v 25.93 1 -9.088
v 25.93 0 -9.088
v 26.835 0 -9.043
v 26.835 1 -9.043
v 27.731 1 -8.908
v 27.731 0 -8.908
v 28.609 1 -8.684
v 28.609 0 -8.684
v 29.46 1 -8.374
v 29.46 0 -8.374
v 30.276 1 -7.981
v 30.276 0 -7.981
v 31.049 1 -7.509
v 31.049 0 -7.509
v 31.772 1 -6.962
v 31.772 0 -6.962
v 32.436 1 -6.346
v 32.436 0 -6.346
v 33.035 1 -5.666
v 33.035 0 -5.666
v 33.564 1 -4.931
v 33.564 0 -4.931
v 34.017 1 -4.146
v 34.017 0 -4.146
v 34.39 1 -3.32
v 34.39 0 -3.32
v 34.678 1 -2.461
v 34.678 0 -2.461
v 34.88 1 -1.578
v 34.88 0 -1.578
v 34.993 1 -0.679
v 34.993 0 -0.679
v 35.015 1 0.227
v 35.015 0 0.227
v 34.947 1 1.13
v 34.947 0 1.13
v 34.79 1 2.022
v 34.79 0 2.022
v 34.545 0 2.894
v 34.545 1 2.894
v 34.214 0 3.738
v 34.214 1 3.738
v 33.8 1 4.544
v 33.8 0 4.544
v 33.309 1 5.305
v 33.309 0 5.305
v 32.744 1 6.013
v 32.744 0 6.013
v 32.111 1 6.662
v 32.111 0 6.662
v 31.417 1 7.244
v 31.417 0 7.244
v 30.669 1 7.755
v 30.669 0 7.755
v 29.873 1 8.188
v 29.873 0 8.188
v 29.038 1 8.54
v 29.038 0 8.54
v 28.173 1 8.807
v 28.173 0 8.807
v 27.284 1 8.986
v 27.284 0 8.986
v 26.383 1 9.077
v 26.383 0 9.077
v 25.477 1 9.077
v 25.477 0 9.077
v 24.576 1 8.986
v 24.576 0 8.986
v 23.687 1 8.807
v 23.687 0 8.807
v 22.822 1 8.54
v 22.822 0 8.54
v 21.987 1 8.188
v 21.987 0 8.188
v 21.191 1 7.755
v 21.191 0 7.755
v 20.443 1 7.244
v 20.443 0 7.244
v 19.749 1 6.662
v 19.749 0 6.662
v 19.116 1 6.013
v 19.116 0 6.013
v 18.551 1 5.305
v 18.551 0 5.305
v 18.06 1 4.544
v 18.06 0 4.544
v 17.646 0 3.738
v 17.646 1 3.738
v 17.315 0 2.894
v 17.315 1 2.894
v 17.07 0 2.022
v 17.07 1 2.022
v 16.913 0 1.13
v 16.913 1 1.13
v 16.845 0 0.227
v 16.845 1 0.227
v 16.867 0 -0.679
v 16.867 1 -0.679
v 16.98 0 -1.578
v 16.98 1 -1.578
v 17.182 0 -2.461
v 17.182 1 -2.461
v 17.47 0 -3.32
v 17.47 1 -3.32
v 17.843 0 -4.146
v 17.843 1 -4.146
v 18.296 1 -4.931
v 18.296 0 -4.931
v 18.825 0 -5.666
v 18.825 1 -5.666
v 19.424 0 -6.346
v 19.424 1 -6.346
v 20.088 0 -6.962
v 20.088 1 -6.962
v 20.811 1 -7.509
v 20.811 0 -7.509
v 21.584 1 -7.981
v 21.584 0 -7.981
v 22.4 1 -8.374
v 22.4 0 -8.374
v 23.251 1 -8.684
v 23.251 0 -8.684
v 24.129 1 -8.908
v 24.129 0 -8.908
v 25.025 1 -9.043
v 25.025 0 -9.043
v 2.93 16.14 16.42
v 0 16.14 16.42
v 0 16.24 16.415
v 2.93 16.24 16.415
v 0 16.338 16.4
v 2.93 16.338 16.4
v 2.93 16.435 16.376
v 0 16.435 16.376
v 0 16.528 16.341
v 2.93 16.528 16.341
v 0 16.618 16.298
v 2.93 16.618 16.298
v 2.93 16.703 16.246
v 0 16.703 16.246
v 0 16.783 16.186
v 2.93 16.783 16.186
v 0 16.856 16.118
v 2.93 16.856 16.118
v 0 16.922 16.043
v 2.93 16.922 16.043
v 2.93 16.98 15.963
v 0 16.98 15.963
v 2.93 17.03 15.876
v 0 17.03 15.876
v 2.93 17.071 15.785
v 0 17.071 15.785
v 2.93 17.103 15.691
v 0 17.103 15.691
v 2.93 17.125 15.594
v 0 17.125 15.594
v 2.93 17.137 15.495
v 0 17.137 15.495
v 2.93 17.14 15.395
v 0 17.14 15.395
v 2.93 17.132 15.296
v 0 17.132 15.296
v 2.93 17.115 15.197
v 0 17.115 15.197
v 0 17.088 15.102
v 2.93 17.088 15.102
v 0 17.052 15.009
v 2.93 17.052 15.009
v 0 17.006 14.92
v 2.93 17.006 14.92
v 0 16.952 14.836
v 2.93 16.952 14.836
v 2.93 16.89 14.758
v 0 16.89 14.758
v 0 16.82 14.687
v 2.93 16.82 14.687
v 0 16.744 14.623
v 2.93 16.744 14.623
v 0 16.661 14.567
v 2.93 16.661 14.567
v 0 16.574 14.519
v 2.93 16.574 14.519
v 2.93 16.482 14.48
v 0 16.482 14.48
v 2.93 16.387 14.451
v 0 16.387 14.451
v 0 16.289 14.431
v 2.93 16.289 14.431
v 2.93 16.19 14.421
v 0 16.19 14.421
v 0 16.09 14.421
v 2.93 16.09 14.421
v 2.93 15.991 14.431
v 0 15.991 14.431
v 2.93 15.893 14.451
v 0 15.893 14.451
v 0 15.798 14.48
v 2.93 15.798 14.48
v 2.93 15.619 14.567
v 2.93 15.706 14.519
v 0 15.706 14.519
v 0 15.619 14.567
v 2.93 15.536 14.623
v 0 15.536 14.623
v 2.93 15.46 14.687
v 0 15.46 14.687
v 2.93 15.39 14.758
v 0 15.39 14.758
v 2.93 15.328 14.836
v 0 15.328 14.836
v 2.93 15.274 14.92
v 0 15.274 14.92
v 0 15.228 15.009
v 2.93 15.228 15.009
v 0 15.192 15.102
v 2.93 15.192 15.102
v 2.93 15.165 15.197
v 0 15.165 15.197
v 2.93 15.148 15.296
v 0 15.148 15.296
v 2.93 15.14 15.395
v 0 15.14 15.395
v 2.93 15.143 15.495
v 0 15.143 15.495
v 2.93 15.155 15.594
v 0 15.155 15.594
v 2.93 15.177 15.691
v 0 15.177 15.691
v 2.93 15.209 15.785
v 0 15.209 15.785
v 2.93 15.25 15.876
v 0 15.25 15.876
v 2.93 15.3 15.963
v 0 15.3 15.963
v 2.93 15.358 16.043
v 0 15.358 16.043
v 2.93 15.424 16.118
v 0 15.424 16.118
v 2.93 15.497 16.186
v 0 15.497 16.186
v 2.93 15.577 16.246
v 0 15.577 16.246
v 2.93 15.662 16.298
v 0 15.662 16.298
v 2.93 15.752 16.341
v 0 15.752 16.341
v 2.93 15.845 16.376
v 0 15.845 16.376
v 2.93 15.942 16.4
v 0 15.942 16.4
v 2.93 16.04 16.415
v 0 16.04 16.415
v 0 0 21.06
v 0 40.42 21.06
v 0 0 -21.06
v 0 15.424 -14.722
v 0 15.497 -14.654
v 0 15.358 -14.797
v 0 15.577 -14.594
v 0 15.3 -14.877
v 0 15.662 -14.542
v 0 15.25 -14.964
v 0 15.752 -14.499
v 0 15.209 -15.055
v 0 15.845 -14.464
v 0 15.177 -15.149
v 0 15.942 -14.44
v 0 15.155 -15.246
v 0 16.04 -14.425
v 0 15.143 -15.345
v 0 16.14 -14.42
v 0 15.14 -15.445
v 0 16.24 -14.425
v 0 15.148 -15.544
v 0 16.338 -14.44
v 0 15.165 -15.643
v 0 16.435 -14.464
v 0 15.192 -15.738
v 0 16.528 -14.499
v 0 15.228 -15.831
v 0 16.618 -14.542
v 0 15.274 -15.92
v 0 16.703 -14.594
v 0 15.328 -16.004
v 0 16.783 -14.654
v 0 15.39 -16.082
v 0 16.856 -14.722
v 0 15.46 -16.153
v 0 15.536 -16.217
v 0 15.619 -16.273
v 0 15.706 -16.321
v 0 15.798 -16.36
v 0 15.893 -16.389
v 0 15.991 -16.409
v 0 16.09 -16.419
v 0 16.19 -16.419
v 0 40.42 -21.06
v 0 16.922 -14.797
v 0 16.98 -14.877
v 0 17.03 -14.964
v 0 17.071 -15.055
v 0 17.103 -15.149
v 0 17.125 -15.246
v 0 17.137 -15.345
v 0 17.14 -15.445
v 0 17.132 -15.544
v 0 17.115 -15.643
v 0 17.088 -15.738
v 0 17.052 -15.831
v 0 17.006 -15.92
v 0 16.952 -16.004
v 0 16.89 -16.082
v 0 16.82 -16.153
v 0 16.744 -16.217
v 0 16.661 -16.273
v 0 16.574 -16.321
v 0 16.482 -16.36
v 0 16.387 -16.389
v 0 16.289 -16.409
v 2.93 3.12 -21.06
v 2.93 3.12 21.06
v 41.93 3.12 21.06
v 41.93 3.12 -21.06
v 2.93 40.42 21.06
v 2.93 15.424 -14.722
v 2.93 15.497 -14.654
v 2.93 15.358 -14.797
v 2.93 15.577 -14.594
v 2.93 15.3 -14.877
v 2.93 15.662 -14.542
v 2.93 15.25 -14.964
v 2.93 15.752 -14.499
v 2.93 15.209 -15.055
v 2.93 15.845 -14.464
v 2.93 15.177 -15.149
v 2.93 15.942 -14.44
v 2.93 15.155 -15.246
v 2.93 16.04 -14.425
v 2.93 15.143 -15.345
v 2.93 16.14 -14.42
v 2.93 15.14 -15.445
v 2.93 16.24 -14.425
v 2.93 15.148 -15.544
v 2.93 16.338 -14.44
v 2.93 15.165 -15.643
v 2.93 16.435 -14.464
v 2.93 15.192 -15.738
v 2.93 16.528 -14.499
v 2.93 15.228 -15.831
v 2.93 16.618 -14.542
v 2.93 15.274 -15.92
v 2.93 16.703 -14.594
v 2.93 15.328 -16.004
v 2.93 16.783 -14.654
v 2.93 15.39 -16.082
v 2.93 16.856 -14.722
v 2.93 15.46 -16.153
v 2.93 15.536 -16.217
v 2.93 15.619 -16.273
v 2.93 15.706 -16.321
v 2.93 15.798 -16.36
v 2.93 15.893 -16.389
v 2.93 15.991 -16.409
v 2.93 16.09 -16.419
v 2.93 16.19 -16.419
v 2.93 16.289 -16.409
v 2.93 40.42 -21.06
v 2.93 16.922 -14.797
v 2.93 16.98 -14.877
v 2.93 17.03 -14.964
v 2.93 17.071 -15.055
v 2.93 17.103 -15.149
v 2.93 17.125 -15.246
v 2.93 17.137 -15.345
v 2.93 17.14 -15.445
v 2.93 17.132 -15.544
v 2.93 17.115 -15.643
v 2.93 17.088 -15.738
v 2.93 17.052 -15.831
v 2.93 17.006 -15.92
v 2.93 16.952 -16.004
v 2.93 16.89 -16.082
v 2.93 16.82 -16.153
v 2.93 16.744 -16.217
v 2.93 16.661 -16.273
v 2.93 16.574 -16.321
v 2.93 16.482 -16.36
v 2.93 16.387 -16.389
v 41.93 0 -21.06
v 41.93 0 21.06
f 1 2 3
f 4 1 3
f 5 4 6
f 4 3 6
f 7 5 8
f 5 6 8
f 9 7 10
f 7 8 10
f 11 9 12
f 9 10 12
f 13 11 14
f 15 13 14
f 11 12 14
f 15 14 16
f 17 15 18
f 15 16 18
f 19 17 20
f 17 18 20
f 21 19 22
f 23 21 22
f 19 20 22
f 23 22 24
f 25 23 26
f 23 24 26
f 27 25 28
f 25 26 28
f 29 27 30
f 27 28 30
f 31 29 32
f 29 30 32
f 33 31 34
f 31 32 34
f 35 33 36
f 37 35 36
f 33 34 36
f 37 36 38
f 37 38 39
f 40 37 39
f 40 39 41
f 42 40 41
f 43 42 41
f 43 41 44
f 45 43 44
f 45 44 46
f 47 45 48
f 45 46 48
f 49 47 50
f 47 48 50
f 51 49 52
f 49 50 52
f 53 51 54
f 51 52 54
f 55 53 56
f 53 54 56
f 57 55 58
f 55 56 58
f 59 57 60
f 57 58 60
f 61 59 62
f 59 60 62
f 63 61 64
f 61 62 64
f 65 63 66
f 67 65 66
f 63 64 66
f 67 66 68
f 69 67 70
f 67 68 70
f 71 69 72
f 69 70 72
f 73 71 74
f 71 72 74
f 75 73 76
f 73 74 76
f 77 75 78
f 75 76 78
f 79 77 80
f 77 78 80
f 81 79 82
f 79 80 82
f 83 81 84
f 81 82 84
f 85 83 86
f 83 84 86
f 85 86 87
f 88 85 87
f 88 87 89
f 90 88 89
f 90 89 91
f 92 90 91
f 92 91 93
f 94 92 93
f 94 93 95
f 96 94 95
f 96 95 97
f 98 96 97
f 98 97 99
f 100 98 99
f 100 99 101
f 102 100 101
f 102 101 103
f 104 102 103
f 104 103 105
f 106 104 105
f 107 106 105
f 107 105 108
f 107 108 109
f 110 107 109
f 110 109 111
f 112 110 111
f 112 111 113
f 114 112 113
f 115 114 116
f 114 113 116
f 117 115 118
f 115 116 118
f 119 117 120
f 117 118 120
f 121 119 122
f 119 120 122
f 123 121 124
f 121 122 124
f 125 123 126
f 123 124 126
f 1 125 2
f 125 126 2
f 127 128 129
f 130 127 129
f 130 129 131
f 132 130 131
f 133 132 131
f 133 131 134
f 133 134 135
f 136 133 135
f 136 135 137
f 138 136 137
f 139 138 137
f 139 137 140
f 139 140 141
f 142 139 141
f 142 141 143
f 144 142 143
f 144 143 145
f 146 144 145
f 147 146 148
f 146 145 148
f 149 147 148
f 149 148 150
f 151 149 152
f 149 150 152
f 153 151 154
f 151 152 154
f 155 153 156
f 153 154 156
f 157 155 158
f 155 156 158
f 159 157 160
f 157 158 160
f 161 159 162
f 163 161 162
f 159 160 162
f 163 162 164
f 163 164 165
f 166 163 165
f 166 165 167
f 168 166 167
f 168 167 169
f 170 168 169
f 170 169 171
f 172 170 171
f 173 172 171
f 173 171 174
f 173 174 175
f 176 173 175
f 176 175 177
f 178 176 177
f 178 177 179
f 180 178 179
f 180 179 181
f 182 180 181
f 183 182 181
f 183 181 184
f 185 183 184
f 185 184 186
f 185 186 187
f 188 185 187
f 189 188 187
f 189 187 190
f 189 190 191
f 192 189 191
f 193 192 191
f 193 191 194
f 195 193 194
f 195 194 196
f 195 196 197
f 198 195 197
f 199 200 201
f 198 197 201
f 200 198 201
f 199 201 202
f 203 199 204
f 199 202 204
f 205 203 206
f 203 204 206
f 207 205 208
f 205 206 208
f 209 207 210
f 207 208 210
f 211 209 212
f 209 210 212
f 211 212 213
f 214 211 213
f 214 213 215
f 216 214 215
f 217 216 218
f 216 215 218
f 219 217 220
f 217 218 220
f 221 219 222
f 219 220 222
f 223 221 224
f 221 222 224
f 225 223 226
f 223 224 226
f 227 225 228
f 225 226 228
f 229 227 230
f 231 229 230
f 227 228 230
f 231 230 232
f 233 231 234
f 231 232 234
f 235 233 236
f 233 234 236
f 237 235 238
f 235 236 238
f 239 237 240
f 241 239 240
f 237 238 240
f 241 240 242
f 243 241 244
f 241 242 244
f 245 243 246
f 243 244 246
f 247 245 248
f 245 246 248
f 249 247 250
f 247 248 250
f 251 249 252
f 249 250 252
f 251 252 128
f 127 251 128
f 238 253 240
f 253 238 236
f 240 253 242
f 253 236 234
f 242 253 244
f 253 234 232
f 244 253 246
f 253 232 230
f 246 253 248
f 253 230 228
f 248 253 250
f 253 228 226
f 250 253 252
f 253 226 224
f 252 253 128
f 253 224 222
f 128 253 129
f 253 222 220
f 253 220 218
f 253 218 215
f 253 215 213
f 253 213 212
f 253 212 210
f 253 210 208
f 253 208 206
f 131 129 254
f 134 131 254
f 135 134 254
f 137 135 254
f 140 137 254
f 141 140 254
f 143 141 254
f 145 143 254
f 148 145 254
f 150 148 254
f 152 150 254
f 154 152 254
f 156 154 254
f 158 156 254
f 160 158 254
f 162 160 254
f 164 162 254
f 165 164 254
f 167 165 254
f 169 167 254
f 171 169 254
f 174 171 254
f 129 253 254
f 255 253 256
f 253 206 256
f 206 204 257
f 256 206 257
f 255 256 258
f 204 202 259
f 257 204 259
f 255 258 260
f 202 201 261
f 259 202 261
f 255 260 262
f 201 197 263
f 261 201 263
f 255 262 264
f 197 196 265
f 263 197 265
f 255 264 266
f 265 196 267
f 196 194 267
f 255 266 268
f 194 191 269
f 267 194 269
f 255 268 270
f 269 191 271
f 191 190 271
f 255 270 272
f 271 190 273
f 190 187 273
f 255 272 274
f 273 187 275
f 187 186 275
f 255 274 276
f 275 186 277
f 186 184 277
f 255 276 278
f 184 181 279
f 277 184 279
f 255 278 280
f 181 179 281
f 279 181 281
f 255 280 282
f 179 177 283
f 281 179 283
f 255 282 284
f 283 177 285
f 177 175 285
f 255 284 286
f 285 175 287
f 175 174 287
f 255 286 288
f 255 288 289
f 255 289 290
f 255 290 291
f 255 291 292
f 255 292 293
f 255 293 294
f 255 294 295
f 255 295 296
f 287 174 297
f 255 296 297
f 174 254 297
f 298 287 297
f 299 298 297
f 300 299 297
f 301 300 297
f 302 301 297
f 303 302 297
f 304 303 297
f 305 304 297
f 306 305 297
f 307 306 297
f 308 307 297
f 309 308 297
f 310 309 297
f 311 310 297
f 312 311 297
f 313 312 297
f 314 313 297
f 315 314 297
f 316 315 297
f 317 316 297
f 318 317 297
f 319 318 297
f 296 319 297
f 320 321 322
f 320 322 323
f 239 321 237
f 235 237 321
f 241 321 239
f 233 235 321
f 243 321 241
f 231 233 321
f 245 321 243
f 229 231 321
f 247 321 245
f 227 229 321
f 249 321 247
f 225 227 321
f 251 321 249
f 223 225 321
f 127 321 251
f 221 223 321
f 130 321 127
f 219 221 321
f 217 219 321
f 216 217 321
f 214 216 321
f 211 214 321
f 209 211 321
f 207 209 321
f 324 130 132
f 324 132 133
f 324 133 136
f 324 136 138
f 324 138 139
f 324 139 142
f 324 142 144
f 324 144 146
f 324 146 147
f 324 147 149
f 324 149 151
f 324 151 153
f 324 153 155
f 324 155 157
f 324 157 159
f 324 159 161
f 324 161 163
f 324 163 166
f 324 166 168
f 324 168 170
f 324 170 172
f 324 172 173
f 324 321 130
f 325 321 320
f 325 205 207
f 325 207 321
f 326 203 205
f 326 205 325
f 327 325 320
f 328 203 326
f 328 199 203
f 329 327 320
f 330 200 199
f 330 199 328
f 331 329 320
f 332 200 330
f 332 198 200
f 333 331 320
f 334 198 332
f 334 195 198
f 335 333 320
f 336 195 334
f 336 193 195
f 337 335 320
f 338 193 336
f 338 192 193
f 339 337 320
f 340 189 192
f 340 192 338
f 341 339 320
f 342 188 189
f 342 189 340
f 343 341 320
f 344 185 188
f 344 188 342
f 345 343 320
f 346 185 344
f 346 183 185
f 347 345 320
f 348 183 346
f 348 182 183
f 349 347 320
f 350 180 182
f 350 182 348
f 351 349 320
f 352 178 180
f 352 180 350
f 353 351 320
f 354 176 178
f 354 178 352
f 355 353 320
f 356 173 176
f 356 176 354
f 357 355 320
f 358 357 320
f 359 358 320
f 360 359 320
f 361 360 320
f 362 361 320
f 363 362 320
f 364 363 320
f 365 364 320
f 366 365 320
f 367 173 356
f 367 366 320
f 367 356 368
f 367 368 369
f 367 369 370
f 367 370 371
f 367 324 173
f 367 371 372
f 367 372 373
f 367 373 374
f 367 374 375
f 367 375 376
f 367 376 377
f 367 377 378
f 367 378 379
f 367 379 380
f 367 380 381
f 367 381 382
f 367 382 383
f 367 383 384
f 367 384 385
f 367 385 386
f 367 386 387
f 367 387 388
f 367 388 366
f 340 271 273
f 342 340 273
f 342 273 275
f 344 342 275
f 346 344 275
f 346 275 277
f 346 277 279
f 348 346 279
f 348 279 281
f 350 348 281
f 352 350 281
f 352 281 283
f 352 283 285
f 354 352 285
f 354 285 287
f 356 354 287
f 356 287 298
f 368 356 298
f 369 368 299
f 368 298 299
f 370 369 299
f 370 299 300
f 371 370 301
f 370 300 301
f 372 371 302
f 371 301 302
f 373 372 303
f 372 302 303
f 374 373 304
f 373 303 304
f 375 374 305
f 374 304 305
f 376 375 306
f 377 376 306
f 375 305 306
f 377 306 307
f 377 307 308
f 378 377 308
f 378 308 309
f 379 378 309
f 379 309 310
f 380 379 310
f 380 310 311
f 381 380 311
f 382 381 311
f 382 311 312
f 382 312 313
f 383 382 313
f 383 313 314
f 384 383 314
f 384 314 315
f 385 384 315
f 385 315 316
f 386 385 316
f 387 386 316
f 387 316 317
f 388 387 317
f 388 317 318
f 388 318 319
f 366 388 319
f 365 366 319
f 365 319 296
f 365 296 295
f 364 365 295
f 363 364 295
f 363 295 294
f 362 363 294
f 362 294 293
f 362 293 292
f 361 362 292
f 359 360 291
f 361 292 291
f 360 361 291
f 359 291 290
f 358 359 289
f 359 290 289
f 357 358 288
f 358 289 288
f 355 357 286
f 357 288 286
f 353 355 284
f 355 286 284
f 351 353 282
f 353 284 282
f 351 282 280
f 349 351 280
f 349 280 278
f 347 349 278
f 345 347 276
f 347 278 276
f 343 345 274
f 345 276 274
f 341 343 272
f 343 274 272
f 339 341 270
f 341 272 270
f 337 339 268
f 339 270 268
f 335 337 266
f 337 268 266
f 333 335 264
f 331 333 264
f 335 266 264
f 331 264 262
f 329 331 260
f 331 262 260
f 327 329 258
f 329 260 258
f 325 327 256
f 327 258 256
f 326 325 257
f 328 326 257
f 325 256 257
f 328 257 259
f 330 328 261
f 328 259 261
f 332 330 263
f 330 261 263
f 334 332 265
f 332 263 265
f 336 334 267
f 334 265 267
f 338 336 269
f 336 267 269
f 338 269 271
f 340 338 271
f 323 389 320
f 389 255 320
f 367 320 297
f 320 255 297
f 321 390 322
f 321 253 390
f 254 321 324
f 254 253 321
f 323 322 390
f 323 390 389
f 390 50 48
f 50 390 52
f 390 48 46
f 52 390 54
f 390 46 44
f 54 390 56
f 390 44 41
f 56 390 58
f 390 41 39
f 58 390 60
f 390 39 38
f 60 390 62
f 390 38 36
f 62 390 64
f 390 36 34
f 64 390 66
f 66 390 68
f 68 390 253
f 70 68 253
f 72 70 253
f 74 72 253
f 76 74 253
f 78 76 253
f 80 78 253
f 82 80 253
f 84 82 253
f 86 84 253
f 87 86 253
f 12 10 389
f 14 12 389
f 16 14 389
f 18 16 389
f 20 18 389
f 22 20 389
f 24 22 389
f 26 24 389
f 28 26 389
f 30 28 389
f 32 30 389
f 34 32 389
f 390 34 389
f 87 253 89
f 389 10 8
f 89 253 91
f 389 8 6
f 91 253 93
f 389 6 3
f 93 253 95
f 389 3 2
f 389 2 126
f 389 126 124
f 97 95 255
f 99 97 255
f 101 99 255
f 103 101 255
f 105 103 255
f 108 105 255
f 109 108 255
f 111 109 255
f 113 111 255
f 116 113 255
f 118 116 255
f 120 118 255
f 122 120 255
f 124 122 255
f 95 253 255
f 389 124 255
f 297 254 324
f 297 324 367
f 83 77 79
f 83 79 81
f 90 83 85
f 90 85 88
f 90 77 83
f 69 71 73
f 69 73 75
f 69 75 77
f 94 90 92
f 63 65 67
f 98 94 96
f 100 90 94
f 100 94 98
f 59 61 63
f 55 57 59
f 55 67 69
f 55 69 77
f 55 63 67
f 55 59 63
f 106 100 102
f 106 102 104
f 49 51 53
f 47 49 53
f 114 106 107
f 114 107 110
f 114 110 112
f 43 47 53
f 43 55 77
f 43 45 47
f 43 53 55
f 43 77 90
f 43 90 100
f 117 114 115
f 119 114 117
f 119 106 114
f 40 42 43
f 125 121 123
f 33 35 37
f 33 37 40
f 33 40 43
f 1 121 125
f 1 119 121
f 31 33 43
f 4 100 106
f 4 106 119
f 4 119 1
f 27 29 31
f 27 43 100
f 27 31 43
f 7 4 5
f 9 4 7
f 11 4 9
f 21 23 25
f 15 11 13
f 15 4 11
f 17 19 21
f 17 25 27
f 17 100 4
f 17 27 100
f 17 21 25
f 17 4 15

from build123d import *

# Parameters (mm, degrees)
SKETCH1_W           = 42.12
SKETCH1_H           = 40.42
BOSS_EXTRUDE1_DEPTH = 0.01
SKETCH2_W           = 42.12
SKETCH2_H           = 40.42
BOSS_EXTRUDE2_DEPTH = 2.92
SKETCH3_W           = 42.12
SKETCH3_H           = 3.12
BOSS_EXTRUDE3_DEPTH = 39
SKETCH4_R           = 1
CUT_EXTRUDE1_DEPTH  = 62.930807358
SKETCH5_R           = 9.087989047
CUT_EXTRUDE2_DEPTH  = 1


with BuildPart() as part:
    # Sketch1 → Boss-Extrude1 (new body)
    with BuildSketch(Plane(origin=(0, 0, 0), x_dir=(0, 0, -1), z_dir=(1, 0, 0))):
        with Locations((0, 20.21)):
            Rectangle(SKETCH1_W, SKETCH1_H)
    extrude(amount=BOSS_EXTRUDE1_DEPTH)

    # Sketch2 → Boss-Extrude2 (add)
    with BuildSketch(Plane(origin=(0.01, 0, 0), x_dir=(0, 0, -1), z_dir=(1, 0, 0))):
        with Locations((0, 20.21)):
            Rectangle(SKETCH2_W, SKETCH2_H)
    extrude(amount=BOSS_EXTRUDE2_DEPTH)

    # Sketch3 → Boss-Extrude3 (add)
    with BuildSketch(Plane(origin=(2.93, 0, 0), x_dir=(0, 0, -1), z_dir=(1, 0, 0))):
        with Locations((0, 1.56)):
            Rectangle(SKETCH3_W, SKETCH3_H)
    extrude(amount=BOSS_EXTRUDE3_DEPTH)

    # Sketch4 → Cut-Extrude1 (cut, through all)
    with BuildSketch(Plane.ZY):
        with Locations((15.42, 16.14)):
            Circle(SKETCH4_R)
        with Locations((-15.42, 16.14)):
            Circle(SKETCH4_R)
    extrude(amount=-CUT_EXTRUDE1_DEPTH, mode=Mode.SUBTRACT)

    # Sketch5 → Cut-Extrude2 (cut)
    with BuildSketch(Plane.XZ):
        with Locations(Location((25.93, 0, 0), (0, 0, 270))):
            Circle(SKETCH5_R)
    extrude(amount=-CUT_EXTRUDE2_DEPTH, mode=Mode.SUBTRACT)


solid = part.part
